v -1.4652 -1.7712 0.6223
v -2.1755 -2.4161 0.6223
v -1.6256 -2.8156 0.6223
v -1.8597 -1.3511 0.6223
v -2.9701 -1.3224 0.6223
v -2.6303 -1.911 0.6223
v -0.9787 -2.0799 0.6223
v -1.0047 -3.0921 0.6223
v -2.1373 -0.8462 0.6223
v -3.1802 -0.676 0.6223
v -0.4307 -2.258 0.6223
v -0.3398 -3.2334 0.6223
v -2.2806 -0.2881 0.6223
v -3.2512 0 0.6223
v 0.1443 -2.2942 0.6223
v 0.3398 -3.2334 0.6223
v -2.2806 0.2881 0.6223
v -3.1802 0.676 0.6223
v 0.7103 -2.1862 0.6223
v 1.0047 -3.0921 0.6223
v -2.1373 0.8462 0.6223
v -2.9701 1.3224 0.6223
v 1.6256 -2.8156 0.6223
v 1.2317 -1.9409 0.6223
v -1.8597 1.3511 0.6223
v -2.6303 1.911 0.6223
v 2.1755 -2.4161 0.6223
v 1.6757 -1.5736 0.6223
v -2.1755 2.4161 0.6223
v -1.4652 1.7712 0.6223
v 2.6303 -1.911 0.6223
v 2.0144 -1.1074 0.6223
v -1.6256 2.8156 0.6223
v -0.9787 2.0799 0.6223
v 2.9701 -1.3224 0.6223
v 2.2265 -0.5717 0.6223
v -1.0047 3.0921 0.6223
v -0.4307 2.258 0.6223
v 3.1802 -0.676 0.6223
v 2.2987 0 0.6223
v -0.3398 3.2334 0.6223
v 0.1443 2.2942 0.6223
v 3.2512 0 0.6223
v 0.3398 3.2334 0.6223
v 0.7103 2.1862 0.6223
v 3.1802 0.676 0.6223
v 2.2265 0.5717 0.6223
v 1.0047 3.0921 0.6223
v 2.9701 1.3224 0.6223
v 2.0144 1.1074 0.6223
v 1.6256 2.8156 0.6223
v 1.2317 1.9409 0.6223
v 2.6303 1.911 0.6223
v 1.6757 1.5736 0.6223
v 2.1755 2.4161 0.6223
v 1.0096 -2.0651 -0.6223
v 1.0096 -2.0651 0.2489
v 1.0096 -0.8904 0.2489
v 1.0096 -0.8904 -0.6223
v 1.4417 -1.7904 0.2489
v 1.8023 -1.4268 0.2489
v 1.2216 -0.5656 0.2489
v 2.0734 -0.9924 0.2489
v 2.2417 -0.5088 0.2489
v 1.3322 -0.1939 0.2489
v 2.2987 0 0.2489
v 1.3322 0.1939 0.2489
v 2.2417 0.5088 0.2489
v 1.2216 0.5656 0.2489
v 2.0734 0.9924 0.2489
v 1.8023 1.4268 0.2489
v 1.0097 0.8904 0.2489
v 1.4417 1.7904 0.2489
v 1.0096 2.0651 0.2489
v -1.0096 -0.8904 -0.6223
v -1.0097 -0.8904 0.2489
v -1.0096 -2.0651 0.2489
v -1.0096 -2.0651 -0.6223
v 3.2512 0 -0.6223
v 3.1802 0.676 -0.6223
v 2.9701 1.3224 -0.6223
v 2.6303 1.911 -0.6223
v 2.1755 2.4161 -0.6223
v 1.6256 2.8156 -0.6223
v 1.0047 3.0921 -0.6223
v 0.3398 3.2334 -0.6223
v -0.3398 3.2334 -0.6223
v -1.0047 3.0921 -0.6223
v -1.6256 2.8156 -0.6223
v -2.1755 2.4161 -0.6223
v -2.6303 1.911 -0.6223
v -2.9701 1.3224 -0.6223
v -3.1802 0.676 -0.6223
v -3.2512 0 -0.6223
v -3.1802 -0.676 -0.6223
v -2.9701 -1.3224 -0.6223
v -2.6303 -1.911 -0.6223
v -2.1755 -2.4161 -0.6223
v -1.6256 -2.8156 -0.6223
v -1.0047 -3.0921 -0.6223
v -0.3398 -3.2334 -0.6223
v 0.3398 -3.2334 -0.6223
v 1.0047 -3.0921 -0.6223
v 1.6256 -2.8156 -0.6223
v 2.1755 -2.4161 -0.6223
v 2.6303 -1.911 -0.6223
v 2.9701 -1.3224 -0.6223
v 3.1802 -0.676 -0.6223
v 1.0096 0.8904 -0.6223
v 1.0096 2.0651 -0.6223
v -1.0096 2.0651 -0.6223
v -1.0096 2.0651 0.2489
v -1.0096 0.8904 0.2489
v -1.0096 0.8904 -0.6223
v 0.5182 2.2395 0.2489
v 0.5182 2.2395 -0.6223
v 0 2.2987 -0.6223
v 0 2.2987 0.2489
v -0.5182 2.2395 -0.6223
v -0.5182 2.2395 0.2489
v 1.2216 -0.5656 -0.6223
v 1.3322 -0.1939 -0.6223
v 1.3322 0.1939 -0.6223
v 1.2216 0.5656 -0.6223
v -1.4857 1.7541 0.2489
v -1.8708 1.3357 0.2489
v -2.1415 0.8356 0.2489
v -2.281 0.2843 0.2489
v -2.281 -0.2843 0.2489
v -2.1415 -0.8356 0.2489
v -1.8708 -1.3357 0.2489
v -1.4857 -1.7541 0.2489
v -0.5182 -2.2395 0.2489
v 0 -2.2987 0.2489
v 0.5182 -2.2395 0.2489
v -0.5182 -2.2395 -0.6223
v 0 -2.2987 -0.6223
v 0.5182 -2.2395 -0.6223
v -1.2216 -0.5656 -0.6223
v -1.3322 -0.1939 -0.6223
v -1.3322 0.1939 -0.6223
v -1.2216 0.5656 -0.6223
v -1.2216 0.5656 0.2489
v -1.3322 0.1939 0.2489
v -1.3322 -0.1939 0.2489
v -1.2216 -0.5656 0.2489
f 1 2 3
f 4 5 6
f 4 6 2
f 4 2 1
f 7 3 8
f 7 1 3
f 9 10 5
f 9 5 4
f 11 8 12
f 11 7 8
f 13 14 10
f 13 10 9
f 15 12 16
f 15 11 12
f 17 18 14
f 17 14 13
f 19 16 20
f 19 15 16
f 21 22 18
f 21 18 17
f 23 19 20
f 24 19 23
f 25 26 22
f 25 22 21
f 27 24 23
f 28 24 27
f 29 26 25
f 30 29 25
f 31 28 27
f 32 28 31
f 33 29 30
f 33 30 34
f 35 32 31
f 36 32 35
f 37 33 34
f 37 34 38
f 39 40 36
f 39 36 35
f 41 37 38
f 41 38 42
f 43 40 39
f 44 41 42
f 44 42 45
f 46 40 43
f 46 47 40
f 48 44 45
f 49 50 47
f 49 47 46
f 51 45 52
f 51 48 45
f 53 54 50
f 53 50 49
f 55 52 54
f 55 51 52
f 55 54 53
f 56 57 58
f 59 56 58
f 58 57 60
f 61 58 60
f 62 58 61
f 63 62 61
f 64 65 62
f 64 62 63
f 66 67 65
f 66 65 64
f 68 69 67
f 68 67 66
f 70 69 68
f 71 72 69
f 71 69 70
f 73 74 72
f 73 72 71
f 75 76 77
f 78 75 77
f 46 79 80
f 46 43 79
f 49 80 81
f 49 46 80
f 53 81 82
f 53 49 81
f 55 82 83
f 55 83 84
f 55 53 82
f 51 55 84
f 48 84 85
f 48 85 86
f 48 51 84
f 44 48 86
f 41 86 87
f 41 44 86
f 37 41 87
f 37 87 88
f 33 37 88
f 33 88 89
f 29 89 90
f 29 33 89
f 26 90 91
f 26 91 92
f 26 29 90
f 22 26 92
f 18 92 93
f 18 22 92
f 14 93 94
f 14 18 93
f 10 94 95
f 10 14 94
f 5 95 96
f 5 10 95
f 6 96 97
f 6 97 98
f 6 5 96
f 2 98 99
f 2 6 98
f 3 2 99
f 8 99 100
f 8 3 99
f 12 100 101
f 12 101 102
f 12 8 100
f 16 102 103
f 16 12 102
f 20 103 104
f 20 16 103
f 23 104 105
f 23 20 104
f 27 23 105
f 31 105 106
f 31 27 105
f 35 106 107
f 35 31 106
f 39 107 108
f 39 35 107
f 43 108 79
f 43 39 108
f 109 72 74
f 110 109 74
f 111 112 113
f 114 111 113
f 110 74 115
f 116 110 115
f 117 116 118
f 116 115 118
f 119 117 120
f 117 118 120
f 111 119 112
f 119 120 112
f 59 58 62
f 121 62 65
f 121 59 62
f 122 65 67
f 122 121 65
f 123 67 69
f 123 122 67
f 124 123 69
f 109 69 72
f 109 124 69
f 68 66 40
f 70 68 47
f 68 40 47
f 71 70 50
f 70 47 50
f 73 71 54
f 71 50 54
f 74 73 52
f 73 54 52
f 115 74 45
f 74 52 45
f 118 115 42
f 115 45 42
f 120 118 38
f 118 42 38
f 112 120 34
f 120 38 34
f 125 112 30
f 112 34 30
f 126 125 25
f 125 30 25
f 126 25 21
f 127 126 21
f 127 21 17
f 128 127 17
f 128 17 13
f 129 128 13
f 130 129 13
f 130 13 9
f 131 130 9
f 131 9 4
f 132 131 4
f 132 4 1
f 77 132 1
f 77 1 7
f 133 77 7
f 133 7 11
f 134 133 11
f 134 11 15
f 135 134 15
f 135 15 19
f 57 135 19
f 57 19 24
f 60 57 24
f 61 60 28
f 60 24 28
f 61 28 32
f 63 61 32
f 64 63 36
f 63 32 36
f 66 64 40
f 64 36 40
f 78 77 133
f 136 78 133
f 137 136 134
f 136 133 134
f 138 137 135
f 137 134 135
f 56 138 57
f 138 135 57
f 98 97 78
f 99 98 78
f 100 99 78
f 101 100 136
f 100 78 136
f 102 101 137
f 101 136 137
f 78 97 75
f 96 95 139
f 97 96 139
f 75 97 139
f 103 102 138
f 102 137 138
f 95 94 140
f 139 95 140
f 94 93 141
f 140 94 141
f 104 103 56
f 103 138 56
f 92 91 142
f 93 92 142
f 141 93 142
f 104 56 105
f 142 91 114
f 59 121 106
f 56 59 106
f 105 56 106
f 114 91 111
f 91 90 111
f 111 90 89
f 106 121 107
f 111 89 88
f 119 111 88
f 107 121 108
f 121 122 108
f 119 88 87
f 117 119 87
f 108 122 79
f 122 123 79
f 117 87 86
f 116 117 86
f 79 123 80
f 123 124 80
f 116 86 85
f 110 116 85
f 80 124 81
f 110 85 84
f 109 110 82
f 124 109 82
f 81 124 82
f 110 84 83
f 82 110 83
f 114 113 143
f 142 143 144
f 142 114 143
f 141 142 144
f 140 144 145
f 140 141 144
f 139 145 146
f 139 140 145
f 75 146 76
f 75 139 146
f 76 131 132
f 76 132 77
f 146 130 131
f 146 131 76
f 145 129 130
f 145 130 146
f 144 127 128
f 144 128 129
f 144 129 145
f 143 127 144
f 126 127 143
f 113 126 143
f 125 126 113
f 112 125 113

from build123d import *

# Parameters (mm, degrees)
SKETCH1_R          = 3.2512
SKETCH1_R_2        = 1.3462
EXTRUDE1_DEPTH     = 0.6223
SKETCH2_R          = 2.2987
CUT_EXTRUDE1_DEPTH = 0.37338
CUT_EXTRUDE2_DEPTH = 1.87122
CIRPATTERN1_COUNT  = 2


with BuildPart() as part:
    # Sketch1 → Extrude1 (new body, symmetric)
    with BuildSketch(Plane.XY):
        Circle(SKETCH1_R)
        Circle(SKETCH1_R_2, mode=Mode.SUBTRACT)
    extrude(amount=EXTRUDE1_DEPTH, both=True)

    # Sketch2 → Cut-Extrude1 (cut)
    with BuildSketch(Plane.XY.offset(0.6223)):
        Circle(SKETCH2_R)
    extrude(amount=-CUT_EXTRUDE1_DEPTH, mode=Mode.SUBTRACT)

    # Sketch3 → Cut-Extrude2 (cut, through all)
    with BuildSketch(Plane.XY.offset(0.24892)):
        with BuildLine():
            Line((-1.00965, 2.065097714), (-1.00965, 0.890427604))
            ThreePointArc((-1.00965, 0.890427604), (0, 1.3462), (1.00965, 0.890427604))
            Line((1.00965, 0.890427604), (1.00965, 2.065097714))
            ThreePointArc((1.00965, 2.065097714), (0, 2.2987), (-1.00965, 2.065097714))
        make_face()
    cut_extrude2 = extrude(amount=-CUT_EXTRUDE2_DEPTH, mode=Mode.SUBTRACT)

    # CirPattern1: Cut-Extrude2 ×2 about axis
    cirpattern1_axis = Axis((0, 0, 0.6223), (0, 0, -1))
    for i in range(1, CIRPATTERN1_COUNT):
        add(cut_extrude2.rotate(cirpattern1_axis, i * 360 / CIRPATTERN1_COUNT), mode=Mode.SUBTRACT)


solid = part.part
